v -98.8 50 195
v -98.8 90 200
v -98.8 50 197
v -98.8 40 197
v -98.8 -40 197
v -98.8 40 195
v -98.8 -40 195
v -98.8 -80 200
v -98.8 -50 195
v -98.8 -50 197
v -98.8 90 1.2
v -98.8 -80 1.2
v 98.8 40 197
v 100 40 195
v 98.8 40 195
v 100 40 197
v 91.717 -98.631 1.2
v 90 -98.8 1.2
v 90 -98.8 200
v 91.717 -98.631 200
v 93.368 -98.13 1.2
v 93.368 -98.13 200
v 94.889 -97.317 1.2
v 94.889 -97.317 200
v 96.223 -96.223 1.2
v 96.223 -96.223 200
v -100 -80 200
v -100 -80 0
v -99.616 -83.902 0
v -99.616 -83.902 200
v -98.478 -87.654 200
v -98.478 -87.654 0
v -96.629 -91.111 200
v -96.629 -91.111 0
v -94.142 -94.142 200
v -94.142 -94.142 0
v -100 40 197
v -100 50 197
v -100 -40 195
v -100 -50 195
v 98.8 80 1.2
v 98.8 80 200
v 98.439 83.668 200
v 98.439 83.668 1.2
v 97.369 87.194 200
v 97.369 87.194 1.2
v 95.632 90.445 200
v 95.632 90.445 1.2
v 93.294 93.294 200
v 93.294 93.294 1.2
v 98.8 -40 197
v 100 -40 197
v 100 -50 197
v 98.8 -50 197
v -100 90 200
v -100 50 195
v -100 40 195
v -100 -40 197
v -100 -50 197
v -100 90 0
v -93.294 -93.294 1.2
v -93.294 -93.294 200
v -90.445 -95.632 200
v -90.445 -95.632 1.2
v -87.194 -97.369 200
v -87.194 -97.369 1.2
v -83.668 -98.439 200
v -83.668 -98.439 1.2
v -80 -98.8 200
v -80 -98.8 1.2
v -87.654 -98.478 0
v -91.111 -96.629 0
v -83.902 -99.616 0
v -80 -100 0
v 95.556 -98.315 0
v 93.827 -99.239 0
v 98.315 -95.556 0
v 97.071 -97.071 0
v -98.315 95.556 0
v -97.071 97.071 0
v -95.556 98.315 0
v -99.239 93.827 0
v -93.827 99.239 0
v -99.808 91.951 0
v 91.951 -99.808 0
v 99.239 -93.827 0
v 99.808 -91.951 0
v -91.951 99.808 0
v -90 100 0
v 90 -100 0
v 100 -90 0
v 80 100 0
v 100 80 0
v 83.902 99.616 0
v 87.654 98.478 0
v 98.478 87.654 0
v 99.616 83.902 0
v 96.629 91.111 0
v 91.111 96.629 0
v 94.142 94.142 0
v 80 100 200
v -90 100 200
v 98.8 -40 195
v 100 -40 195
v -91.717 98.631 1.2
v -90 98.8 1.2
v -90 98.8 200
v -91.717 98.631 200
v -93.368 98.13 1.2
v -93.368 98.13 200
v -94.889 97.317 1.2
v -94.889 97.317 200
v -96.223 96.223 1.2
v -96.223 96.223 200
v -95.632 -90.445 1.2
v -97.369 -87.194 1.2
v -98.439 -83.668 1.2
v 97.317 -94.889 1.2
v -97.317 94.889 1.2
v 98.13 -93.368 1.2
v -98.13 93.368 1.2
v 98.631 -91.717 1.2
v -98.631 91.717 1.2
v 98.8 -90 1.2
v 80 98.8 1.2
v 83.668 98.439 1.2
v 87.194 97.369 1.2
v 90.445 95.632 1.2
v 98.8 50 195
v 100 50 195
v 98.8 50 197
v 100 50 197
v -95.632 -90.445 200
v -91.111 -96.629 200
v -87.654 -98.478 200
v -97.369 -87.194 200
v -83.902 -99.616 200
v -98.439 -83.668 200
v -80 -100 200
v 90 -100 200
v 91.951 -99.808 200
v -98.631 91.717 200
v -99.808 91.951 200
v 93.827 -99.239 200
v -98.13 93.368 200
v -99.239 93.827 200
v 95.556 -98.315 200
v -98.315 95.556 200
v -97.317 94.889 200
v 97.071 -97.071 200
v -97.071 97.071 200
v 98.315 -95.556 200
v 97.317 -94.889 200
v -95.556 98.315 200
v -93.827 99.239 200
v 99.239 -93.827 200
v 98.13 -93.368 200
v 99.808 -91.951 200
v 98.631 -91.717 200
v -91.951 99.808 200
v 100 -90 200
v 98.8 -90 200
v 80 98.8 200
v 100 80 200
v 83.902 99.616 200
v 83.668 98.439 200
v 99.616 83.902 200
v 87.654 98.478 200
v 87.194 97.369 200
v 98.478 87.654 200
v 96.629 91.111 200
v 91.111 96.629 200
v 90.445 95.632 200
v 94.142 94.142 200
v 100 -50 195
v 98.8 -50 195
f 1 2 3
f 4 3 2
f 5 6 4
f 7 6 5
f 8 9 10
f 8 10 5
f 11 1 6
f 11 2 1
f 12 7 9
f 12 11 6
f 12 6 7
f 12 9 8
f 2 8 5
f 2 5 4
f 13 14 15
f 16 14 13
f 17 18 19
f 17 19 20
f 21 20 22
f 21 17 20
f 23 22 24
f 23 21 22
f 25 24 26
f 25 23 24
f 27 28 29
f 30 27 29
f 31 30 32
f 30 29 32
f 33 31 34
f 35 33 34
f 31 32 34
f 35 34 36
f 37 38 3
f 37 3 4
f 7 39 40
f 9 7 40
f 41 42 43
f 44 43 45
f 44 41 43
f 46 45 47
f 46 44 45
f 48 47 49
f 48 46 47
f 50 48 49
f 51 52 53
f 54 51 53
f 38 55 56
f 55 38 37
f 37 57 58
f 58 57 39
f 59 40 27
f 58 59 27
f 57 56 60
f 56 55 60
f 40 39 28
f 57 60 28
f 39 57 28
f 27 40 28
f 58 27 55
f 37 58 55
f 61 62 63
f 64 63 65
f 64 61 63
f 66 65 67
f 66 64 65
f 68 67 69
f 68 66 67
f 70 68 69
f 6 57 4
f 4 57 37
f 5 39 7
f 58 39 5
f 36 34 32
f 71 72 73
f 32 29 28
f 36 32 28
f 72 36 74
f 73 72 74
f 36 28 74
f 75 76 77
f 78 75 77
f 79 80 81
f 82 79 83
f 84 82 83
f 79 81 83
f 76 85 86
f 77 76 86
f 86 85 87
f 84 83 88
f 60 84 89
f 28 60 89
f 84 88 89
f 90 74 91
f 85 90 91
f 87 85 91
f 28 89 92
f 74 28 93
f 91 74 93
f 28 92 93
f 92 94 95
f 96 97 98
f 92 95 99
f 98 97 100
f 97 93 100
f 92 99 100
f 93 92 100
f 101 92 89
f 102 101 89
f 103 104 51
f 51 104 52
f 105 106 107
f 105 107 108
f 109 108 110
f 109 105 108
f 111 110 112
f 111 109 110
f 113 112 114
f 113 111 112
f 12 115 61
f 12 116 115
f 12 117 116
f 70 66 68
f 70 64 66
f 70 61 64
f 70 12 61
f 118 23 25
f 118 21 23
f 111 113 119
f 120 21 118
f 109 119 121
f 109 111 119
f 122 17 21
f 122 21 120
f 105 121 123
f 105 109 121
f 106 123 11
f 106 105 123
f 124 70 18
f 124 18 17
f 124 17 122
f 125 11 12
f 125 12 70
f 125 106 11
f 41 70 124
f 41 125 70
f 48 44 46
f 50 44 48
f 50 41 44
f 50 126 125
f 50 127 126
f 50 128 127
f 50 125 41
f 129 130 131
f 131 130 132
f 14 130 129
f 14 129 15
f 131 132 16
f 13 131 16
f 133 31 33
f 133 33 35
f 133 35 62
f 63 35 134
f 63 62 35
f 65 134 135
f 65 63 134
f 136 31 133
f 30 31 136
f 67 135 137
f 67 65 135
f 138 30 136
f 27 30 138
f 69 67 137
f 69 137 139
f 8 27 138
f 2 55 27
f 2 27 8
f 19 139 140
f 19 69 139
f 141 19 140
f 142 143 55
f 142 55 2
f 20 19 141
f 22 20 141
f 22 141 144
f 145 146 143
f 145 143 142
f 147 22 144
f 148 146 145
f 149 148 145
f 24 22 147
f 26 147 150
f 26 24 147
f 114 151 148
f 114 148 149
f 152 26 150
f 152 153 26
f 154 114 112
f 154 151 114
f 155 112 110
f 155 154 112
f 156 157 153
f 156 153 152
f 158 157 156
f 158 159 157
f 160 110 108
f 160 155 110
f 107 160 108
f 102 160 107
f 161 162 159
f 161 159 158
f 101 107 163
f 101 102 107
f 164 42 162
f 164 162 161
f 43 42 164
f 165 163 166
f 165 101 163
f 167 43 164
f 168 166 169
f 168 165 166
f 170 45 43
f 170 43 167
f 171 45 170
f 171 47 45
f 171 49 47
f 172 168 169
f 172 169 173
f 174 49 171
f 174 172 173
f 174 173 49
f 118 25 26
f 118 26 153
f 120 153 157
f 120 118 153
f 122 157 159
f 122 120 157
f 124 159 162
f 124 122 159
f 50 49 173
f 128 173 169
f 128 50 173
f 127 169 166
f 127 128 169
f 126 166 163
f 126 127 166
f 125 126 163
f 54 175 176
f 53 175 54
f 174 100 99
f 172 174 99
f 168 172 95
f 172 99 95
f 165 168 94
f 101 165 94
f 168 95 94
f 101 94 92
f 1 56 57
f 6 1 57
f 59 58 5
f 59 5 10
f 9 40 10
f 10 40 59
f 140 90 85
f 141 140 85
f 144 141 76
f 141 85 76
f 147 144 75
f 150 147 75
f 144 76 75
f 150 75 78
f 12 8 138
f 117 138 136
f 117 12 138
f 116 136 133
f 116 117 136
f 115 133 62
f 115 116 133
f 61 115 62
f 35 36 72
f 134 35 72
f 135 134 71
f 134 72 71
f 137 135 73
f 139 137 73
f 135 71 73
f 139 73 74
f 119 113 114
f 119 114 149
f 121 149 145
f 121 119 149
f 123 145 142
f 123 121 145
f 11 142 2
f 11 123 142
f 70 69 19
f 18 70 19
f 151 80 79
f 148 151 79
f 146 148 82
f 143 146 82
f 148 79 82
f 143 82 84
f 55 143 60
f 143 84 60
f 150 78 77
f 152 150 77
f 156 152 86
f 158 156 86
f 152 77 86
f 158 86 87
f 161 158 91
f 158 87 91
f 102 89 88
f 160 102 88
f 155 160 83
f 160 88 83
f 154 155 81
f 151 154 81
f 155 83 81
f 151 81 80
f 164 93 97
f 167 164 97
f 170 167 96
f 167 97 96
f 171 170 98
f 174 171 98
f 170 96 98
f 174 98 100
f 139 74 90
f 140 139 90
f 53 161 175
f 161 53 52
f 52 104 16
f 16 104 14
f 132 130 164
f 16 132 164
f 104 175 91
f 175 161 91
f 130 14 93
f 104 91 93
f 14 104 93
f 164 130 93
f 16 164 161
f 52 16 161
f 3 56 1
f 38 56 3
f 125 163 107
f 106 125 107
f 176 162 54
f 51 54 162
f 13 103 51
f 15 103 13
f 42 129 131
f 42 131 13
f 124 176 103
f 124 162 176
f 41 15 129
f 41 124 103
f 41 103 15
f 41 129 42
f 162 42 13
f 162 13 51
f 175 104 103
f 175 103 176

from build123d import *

# Parameters (mm, degrees)
F1_DEPTH = 200
F2_T     = -1.2
F3_W     = 10
F3_H     = 2
F4_DEPTH = 1.2


with BuildPart() as f1:
    # F0 (on Top) → F1 (new body)
    with BuildSketch(Plane.XY):
        with BuildLine():
            Line((80, 100), (-90, 100))
            ThreePointArc((-90, 100), (-93.826834, 99.238795), (-97.071068, 97.071068))
            Line((-97.071068, 97.071068), (0, 0))
            Line((0, 0), (94.142136, 94.142136))
            ThreePointArc((94.142136, 94.142136), (87.653669, 98.477591), (80, 100))
        make_face()
        with BuildLine():
            ThreePointArc((100, 80), (98.477591, 87.653669), (94.142136, 94.142136))
            Line((94.142136, 94.142136), (0, 0))
            Line((0, 0), (97.071068, -97.071068))
            ThreePointArc((97.071068, -97.071068), (99.238795, -93.826834), (100, -90))
            Line((100, -90), (100, 80))
        make_face()
        with BuildLine():
            Line((97.071068, -97.071068), (0, 0))
            Line((0, 0), (-94.142136, -94.142136))
            ThreePointArc((-94.142136, -94.142136), (-87.653669, -98.477591), (-80, -100))
            Line((-80, -100), (90, -100))
            ThreePointArc((90, -100), (93.826834, -99.238795), (97.071068, -97.071068))
        make_face()
        with BuildLine():
            Line((0, 0), (-97.071068, 97.071068))
            ThreePointArc((-97.071068, 97.071068), (-99.238795, 93.826834), (-100, 90))
            Line((-100, 90), (-100, -80))
            ThreePointArc((-100, -80), (-98.477591, -87.653669), (-94.142136, -94.142136))
            Line((-94.142136, -94.142136), (0, 0))
        make_face()
    extrude(amount=F1_DEPTH)

    # F2
    f2_openings = [f1.faces().sort_by_distance(p)[0] for p in [
        (0, 0, 200),
    ]]
    offset(amount=F2_T, openings=f2_openings)


with BuildPart() as f4:
    # F3 (on face) → F4 (new body, through all)
    with BuildSketch(Plane(origin=(-100, 0, 0), x_dir=(0, -1, 0), z_dir=(-1, 0, 0))):
        with Locations((-45, 196)):
            Rectangle(F3_W, F3_H)
        with Locations((45, 196)):
            Rectangle(F3_W, F3_H)
    extrude(amount=-F4_DEPTH)


with BuildPart() as f5_1:
    # F5: instance of F4
    add(f4.part.mirror(Plane.YZ))


with BuildPart() as f1_1:
    add(f1.part)

    # F6: cut F4, F5_1
    add(f4.part, mode=Mode.SUBTRACT)
    add(f5_1.part, mode=Mode.SUBTRACT)


solid = f1_1.part
